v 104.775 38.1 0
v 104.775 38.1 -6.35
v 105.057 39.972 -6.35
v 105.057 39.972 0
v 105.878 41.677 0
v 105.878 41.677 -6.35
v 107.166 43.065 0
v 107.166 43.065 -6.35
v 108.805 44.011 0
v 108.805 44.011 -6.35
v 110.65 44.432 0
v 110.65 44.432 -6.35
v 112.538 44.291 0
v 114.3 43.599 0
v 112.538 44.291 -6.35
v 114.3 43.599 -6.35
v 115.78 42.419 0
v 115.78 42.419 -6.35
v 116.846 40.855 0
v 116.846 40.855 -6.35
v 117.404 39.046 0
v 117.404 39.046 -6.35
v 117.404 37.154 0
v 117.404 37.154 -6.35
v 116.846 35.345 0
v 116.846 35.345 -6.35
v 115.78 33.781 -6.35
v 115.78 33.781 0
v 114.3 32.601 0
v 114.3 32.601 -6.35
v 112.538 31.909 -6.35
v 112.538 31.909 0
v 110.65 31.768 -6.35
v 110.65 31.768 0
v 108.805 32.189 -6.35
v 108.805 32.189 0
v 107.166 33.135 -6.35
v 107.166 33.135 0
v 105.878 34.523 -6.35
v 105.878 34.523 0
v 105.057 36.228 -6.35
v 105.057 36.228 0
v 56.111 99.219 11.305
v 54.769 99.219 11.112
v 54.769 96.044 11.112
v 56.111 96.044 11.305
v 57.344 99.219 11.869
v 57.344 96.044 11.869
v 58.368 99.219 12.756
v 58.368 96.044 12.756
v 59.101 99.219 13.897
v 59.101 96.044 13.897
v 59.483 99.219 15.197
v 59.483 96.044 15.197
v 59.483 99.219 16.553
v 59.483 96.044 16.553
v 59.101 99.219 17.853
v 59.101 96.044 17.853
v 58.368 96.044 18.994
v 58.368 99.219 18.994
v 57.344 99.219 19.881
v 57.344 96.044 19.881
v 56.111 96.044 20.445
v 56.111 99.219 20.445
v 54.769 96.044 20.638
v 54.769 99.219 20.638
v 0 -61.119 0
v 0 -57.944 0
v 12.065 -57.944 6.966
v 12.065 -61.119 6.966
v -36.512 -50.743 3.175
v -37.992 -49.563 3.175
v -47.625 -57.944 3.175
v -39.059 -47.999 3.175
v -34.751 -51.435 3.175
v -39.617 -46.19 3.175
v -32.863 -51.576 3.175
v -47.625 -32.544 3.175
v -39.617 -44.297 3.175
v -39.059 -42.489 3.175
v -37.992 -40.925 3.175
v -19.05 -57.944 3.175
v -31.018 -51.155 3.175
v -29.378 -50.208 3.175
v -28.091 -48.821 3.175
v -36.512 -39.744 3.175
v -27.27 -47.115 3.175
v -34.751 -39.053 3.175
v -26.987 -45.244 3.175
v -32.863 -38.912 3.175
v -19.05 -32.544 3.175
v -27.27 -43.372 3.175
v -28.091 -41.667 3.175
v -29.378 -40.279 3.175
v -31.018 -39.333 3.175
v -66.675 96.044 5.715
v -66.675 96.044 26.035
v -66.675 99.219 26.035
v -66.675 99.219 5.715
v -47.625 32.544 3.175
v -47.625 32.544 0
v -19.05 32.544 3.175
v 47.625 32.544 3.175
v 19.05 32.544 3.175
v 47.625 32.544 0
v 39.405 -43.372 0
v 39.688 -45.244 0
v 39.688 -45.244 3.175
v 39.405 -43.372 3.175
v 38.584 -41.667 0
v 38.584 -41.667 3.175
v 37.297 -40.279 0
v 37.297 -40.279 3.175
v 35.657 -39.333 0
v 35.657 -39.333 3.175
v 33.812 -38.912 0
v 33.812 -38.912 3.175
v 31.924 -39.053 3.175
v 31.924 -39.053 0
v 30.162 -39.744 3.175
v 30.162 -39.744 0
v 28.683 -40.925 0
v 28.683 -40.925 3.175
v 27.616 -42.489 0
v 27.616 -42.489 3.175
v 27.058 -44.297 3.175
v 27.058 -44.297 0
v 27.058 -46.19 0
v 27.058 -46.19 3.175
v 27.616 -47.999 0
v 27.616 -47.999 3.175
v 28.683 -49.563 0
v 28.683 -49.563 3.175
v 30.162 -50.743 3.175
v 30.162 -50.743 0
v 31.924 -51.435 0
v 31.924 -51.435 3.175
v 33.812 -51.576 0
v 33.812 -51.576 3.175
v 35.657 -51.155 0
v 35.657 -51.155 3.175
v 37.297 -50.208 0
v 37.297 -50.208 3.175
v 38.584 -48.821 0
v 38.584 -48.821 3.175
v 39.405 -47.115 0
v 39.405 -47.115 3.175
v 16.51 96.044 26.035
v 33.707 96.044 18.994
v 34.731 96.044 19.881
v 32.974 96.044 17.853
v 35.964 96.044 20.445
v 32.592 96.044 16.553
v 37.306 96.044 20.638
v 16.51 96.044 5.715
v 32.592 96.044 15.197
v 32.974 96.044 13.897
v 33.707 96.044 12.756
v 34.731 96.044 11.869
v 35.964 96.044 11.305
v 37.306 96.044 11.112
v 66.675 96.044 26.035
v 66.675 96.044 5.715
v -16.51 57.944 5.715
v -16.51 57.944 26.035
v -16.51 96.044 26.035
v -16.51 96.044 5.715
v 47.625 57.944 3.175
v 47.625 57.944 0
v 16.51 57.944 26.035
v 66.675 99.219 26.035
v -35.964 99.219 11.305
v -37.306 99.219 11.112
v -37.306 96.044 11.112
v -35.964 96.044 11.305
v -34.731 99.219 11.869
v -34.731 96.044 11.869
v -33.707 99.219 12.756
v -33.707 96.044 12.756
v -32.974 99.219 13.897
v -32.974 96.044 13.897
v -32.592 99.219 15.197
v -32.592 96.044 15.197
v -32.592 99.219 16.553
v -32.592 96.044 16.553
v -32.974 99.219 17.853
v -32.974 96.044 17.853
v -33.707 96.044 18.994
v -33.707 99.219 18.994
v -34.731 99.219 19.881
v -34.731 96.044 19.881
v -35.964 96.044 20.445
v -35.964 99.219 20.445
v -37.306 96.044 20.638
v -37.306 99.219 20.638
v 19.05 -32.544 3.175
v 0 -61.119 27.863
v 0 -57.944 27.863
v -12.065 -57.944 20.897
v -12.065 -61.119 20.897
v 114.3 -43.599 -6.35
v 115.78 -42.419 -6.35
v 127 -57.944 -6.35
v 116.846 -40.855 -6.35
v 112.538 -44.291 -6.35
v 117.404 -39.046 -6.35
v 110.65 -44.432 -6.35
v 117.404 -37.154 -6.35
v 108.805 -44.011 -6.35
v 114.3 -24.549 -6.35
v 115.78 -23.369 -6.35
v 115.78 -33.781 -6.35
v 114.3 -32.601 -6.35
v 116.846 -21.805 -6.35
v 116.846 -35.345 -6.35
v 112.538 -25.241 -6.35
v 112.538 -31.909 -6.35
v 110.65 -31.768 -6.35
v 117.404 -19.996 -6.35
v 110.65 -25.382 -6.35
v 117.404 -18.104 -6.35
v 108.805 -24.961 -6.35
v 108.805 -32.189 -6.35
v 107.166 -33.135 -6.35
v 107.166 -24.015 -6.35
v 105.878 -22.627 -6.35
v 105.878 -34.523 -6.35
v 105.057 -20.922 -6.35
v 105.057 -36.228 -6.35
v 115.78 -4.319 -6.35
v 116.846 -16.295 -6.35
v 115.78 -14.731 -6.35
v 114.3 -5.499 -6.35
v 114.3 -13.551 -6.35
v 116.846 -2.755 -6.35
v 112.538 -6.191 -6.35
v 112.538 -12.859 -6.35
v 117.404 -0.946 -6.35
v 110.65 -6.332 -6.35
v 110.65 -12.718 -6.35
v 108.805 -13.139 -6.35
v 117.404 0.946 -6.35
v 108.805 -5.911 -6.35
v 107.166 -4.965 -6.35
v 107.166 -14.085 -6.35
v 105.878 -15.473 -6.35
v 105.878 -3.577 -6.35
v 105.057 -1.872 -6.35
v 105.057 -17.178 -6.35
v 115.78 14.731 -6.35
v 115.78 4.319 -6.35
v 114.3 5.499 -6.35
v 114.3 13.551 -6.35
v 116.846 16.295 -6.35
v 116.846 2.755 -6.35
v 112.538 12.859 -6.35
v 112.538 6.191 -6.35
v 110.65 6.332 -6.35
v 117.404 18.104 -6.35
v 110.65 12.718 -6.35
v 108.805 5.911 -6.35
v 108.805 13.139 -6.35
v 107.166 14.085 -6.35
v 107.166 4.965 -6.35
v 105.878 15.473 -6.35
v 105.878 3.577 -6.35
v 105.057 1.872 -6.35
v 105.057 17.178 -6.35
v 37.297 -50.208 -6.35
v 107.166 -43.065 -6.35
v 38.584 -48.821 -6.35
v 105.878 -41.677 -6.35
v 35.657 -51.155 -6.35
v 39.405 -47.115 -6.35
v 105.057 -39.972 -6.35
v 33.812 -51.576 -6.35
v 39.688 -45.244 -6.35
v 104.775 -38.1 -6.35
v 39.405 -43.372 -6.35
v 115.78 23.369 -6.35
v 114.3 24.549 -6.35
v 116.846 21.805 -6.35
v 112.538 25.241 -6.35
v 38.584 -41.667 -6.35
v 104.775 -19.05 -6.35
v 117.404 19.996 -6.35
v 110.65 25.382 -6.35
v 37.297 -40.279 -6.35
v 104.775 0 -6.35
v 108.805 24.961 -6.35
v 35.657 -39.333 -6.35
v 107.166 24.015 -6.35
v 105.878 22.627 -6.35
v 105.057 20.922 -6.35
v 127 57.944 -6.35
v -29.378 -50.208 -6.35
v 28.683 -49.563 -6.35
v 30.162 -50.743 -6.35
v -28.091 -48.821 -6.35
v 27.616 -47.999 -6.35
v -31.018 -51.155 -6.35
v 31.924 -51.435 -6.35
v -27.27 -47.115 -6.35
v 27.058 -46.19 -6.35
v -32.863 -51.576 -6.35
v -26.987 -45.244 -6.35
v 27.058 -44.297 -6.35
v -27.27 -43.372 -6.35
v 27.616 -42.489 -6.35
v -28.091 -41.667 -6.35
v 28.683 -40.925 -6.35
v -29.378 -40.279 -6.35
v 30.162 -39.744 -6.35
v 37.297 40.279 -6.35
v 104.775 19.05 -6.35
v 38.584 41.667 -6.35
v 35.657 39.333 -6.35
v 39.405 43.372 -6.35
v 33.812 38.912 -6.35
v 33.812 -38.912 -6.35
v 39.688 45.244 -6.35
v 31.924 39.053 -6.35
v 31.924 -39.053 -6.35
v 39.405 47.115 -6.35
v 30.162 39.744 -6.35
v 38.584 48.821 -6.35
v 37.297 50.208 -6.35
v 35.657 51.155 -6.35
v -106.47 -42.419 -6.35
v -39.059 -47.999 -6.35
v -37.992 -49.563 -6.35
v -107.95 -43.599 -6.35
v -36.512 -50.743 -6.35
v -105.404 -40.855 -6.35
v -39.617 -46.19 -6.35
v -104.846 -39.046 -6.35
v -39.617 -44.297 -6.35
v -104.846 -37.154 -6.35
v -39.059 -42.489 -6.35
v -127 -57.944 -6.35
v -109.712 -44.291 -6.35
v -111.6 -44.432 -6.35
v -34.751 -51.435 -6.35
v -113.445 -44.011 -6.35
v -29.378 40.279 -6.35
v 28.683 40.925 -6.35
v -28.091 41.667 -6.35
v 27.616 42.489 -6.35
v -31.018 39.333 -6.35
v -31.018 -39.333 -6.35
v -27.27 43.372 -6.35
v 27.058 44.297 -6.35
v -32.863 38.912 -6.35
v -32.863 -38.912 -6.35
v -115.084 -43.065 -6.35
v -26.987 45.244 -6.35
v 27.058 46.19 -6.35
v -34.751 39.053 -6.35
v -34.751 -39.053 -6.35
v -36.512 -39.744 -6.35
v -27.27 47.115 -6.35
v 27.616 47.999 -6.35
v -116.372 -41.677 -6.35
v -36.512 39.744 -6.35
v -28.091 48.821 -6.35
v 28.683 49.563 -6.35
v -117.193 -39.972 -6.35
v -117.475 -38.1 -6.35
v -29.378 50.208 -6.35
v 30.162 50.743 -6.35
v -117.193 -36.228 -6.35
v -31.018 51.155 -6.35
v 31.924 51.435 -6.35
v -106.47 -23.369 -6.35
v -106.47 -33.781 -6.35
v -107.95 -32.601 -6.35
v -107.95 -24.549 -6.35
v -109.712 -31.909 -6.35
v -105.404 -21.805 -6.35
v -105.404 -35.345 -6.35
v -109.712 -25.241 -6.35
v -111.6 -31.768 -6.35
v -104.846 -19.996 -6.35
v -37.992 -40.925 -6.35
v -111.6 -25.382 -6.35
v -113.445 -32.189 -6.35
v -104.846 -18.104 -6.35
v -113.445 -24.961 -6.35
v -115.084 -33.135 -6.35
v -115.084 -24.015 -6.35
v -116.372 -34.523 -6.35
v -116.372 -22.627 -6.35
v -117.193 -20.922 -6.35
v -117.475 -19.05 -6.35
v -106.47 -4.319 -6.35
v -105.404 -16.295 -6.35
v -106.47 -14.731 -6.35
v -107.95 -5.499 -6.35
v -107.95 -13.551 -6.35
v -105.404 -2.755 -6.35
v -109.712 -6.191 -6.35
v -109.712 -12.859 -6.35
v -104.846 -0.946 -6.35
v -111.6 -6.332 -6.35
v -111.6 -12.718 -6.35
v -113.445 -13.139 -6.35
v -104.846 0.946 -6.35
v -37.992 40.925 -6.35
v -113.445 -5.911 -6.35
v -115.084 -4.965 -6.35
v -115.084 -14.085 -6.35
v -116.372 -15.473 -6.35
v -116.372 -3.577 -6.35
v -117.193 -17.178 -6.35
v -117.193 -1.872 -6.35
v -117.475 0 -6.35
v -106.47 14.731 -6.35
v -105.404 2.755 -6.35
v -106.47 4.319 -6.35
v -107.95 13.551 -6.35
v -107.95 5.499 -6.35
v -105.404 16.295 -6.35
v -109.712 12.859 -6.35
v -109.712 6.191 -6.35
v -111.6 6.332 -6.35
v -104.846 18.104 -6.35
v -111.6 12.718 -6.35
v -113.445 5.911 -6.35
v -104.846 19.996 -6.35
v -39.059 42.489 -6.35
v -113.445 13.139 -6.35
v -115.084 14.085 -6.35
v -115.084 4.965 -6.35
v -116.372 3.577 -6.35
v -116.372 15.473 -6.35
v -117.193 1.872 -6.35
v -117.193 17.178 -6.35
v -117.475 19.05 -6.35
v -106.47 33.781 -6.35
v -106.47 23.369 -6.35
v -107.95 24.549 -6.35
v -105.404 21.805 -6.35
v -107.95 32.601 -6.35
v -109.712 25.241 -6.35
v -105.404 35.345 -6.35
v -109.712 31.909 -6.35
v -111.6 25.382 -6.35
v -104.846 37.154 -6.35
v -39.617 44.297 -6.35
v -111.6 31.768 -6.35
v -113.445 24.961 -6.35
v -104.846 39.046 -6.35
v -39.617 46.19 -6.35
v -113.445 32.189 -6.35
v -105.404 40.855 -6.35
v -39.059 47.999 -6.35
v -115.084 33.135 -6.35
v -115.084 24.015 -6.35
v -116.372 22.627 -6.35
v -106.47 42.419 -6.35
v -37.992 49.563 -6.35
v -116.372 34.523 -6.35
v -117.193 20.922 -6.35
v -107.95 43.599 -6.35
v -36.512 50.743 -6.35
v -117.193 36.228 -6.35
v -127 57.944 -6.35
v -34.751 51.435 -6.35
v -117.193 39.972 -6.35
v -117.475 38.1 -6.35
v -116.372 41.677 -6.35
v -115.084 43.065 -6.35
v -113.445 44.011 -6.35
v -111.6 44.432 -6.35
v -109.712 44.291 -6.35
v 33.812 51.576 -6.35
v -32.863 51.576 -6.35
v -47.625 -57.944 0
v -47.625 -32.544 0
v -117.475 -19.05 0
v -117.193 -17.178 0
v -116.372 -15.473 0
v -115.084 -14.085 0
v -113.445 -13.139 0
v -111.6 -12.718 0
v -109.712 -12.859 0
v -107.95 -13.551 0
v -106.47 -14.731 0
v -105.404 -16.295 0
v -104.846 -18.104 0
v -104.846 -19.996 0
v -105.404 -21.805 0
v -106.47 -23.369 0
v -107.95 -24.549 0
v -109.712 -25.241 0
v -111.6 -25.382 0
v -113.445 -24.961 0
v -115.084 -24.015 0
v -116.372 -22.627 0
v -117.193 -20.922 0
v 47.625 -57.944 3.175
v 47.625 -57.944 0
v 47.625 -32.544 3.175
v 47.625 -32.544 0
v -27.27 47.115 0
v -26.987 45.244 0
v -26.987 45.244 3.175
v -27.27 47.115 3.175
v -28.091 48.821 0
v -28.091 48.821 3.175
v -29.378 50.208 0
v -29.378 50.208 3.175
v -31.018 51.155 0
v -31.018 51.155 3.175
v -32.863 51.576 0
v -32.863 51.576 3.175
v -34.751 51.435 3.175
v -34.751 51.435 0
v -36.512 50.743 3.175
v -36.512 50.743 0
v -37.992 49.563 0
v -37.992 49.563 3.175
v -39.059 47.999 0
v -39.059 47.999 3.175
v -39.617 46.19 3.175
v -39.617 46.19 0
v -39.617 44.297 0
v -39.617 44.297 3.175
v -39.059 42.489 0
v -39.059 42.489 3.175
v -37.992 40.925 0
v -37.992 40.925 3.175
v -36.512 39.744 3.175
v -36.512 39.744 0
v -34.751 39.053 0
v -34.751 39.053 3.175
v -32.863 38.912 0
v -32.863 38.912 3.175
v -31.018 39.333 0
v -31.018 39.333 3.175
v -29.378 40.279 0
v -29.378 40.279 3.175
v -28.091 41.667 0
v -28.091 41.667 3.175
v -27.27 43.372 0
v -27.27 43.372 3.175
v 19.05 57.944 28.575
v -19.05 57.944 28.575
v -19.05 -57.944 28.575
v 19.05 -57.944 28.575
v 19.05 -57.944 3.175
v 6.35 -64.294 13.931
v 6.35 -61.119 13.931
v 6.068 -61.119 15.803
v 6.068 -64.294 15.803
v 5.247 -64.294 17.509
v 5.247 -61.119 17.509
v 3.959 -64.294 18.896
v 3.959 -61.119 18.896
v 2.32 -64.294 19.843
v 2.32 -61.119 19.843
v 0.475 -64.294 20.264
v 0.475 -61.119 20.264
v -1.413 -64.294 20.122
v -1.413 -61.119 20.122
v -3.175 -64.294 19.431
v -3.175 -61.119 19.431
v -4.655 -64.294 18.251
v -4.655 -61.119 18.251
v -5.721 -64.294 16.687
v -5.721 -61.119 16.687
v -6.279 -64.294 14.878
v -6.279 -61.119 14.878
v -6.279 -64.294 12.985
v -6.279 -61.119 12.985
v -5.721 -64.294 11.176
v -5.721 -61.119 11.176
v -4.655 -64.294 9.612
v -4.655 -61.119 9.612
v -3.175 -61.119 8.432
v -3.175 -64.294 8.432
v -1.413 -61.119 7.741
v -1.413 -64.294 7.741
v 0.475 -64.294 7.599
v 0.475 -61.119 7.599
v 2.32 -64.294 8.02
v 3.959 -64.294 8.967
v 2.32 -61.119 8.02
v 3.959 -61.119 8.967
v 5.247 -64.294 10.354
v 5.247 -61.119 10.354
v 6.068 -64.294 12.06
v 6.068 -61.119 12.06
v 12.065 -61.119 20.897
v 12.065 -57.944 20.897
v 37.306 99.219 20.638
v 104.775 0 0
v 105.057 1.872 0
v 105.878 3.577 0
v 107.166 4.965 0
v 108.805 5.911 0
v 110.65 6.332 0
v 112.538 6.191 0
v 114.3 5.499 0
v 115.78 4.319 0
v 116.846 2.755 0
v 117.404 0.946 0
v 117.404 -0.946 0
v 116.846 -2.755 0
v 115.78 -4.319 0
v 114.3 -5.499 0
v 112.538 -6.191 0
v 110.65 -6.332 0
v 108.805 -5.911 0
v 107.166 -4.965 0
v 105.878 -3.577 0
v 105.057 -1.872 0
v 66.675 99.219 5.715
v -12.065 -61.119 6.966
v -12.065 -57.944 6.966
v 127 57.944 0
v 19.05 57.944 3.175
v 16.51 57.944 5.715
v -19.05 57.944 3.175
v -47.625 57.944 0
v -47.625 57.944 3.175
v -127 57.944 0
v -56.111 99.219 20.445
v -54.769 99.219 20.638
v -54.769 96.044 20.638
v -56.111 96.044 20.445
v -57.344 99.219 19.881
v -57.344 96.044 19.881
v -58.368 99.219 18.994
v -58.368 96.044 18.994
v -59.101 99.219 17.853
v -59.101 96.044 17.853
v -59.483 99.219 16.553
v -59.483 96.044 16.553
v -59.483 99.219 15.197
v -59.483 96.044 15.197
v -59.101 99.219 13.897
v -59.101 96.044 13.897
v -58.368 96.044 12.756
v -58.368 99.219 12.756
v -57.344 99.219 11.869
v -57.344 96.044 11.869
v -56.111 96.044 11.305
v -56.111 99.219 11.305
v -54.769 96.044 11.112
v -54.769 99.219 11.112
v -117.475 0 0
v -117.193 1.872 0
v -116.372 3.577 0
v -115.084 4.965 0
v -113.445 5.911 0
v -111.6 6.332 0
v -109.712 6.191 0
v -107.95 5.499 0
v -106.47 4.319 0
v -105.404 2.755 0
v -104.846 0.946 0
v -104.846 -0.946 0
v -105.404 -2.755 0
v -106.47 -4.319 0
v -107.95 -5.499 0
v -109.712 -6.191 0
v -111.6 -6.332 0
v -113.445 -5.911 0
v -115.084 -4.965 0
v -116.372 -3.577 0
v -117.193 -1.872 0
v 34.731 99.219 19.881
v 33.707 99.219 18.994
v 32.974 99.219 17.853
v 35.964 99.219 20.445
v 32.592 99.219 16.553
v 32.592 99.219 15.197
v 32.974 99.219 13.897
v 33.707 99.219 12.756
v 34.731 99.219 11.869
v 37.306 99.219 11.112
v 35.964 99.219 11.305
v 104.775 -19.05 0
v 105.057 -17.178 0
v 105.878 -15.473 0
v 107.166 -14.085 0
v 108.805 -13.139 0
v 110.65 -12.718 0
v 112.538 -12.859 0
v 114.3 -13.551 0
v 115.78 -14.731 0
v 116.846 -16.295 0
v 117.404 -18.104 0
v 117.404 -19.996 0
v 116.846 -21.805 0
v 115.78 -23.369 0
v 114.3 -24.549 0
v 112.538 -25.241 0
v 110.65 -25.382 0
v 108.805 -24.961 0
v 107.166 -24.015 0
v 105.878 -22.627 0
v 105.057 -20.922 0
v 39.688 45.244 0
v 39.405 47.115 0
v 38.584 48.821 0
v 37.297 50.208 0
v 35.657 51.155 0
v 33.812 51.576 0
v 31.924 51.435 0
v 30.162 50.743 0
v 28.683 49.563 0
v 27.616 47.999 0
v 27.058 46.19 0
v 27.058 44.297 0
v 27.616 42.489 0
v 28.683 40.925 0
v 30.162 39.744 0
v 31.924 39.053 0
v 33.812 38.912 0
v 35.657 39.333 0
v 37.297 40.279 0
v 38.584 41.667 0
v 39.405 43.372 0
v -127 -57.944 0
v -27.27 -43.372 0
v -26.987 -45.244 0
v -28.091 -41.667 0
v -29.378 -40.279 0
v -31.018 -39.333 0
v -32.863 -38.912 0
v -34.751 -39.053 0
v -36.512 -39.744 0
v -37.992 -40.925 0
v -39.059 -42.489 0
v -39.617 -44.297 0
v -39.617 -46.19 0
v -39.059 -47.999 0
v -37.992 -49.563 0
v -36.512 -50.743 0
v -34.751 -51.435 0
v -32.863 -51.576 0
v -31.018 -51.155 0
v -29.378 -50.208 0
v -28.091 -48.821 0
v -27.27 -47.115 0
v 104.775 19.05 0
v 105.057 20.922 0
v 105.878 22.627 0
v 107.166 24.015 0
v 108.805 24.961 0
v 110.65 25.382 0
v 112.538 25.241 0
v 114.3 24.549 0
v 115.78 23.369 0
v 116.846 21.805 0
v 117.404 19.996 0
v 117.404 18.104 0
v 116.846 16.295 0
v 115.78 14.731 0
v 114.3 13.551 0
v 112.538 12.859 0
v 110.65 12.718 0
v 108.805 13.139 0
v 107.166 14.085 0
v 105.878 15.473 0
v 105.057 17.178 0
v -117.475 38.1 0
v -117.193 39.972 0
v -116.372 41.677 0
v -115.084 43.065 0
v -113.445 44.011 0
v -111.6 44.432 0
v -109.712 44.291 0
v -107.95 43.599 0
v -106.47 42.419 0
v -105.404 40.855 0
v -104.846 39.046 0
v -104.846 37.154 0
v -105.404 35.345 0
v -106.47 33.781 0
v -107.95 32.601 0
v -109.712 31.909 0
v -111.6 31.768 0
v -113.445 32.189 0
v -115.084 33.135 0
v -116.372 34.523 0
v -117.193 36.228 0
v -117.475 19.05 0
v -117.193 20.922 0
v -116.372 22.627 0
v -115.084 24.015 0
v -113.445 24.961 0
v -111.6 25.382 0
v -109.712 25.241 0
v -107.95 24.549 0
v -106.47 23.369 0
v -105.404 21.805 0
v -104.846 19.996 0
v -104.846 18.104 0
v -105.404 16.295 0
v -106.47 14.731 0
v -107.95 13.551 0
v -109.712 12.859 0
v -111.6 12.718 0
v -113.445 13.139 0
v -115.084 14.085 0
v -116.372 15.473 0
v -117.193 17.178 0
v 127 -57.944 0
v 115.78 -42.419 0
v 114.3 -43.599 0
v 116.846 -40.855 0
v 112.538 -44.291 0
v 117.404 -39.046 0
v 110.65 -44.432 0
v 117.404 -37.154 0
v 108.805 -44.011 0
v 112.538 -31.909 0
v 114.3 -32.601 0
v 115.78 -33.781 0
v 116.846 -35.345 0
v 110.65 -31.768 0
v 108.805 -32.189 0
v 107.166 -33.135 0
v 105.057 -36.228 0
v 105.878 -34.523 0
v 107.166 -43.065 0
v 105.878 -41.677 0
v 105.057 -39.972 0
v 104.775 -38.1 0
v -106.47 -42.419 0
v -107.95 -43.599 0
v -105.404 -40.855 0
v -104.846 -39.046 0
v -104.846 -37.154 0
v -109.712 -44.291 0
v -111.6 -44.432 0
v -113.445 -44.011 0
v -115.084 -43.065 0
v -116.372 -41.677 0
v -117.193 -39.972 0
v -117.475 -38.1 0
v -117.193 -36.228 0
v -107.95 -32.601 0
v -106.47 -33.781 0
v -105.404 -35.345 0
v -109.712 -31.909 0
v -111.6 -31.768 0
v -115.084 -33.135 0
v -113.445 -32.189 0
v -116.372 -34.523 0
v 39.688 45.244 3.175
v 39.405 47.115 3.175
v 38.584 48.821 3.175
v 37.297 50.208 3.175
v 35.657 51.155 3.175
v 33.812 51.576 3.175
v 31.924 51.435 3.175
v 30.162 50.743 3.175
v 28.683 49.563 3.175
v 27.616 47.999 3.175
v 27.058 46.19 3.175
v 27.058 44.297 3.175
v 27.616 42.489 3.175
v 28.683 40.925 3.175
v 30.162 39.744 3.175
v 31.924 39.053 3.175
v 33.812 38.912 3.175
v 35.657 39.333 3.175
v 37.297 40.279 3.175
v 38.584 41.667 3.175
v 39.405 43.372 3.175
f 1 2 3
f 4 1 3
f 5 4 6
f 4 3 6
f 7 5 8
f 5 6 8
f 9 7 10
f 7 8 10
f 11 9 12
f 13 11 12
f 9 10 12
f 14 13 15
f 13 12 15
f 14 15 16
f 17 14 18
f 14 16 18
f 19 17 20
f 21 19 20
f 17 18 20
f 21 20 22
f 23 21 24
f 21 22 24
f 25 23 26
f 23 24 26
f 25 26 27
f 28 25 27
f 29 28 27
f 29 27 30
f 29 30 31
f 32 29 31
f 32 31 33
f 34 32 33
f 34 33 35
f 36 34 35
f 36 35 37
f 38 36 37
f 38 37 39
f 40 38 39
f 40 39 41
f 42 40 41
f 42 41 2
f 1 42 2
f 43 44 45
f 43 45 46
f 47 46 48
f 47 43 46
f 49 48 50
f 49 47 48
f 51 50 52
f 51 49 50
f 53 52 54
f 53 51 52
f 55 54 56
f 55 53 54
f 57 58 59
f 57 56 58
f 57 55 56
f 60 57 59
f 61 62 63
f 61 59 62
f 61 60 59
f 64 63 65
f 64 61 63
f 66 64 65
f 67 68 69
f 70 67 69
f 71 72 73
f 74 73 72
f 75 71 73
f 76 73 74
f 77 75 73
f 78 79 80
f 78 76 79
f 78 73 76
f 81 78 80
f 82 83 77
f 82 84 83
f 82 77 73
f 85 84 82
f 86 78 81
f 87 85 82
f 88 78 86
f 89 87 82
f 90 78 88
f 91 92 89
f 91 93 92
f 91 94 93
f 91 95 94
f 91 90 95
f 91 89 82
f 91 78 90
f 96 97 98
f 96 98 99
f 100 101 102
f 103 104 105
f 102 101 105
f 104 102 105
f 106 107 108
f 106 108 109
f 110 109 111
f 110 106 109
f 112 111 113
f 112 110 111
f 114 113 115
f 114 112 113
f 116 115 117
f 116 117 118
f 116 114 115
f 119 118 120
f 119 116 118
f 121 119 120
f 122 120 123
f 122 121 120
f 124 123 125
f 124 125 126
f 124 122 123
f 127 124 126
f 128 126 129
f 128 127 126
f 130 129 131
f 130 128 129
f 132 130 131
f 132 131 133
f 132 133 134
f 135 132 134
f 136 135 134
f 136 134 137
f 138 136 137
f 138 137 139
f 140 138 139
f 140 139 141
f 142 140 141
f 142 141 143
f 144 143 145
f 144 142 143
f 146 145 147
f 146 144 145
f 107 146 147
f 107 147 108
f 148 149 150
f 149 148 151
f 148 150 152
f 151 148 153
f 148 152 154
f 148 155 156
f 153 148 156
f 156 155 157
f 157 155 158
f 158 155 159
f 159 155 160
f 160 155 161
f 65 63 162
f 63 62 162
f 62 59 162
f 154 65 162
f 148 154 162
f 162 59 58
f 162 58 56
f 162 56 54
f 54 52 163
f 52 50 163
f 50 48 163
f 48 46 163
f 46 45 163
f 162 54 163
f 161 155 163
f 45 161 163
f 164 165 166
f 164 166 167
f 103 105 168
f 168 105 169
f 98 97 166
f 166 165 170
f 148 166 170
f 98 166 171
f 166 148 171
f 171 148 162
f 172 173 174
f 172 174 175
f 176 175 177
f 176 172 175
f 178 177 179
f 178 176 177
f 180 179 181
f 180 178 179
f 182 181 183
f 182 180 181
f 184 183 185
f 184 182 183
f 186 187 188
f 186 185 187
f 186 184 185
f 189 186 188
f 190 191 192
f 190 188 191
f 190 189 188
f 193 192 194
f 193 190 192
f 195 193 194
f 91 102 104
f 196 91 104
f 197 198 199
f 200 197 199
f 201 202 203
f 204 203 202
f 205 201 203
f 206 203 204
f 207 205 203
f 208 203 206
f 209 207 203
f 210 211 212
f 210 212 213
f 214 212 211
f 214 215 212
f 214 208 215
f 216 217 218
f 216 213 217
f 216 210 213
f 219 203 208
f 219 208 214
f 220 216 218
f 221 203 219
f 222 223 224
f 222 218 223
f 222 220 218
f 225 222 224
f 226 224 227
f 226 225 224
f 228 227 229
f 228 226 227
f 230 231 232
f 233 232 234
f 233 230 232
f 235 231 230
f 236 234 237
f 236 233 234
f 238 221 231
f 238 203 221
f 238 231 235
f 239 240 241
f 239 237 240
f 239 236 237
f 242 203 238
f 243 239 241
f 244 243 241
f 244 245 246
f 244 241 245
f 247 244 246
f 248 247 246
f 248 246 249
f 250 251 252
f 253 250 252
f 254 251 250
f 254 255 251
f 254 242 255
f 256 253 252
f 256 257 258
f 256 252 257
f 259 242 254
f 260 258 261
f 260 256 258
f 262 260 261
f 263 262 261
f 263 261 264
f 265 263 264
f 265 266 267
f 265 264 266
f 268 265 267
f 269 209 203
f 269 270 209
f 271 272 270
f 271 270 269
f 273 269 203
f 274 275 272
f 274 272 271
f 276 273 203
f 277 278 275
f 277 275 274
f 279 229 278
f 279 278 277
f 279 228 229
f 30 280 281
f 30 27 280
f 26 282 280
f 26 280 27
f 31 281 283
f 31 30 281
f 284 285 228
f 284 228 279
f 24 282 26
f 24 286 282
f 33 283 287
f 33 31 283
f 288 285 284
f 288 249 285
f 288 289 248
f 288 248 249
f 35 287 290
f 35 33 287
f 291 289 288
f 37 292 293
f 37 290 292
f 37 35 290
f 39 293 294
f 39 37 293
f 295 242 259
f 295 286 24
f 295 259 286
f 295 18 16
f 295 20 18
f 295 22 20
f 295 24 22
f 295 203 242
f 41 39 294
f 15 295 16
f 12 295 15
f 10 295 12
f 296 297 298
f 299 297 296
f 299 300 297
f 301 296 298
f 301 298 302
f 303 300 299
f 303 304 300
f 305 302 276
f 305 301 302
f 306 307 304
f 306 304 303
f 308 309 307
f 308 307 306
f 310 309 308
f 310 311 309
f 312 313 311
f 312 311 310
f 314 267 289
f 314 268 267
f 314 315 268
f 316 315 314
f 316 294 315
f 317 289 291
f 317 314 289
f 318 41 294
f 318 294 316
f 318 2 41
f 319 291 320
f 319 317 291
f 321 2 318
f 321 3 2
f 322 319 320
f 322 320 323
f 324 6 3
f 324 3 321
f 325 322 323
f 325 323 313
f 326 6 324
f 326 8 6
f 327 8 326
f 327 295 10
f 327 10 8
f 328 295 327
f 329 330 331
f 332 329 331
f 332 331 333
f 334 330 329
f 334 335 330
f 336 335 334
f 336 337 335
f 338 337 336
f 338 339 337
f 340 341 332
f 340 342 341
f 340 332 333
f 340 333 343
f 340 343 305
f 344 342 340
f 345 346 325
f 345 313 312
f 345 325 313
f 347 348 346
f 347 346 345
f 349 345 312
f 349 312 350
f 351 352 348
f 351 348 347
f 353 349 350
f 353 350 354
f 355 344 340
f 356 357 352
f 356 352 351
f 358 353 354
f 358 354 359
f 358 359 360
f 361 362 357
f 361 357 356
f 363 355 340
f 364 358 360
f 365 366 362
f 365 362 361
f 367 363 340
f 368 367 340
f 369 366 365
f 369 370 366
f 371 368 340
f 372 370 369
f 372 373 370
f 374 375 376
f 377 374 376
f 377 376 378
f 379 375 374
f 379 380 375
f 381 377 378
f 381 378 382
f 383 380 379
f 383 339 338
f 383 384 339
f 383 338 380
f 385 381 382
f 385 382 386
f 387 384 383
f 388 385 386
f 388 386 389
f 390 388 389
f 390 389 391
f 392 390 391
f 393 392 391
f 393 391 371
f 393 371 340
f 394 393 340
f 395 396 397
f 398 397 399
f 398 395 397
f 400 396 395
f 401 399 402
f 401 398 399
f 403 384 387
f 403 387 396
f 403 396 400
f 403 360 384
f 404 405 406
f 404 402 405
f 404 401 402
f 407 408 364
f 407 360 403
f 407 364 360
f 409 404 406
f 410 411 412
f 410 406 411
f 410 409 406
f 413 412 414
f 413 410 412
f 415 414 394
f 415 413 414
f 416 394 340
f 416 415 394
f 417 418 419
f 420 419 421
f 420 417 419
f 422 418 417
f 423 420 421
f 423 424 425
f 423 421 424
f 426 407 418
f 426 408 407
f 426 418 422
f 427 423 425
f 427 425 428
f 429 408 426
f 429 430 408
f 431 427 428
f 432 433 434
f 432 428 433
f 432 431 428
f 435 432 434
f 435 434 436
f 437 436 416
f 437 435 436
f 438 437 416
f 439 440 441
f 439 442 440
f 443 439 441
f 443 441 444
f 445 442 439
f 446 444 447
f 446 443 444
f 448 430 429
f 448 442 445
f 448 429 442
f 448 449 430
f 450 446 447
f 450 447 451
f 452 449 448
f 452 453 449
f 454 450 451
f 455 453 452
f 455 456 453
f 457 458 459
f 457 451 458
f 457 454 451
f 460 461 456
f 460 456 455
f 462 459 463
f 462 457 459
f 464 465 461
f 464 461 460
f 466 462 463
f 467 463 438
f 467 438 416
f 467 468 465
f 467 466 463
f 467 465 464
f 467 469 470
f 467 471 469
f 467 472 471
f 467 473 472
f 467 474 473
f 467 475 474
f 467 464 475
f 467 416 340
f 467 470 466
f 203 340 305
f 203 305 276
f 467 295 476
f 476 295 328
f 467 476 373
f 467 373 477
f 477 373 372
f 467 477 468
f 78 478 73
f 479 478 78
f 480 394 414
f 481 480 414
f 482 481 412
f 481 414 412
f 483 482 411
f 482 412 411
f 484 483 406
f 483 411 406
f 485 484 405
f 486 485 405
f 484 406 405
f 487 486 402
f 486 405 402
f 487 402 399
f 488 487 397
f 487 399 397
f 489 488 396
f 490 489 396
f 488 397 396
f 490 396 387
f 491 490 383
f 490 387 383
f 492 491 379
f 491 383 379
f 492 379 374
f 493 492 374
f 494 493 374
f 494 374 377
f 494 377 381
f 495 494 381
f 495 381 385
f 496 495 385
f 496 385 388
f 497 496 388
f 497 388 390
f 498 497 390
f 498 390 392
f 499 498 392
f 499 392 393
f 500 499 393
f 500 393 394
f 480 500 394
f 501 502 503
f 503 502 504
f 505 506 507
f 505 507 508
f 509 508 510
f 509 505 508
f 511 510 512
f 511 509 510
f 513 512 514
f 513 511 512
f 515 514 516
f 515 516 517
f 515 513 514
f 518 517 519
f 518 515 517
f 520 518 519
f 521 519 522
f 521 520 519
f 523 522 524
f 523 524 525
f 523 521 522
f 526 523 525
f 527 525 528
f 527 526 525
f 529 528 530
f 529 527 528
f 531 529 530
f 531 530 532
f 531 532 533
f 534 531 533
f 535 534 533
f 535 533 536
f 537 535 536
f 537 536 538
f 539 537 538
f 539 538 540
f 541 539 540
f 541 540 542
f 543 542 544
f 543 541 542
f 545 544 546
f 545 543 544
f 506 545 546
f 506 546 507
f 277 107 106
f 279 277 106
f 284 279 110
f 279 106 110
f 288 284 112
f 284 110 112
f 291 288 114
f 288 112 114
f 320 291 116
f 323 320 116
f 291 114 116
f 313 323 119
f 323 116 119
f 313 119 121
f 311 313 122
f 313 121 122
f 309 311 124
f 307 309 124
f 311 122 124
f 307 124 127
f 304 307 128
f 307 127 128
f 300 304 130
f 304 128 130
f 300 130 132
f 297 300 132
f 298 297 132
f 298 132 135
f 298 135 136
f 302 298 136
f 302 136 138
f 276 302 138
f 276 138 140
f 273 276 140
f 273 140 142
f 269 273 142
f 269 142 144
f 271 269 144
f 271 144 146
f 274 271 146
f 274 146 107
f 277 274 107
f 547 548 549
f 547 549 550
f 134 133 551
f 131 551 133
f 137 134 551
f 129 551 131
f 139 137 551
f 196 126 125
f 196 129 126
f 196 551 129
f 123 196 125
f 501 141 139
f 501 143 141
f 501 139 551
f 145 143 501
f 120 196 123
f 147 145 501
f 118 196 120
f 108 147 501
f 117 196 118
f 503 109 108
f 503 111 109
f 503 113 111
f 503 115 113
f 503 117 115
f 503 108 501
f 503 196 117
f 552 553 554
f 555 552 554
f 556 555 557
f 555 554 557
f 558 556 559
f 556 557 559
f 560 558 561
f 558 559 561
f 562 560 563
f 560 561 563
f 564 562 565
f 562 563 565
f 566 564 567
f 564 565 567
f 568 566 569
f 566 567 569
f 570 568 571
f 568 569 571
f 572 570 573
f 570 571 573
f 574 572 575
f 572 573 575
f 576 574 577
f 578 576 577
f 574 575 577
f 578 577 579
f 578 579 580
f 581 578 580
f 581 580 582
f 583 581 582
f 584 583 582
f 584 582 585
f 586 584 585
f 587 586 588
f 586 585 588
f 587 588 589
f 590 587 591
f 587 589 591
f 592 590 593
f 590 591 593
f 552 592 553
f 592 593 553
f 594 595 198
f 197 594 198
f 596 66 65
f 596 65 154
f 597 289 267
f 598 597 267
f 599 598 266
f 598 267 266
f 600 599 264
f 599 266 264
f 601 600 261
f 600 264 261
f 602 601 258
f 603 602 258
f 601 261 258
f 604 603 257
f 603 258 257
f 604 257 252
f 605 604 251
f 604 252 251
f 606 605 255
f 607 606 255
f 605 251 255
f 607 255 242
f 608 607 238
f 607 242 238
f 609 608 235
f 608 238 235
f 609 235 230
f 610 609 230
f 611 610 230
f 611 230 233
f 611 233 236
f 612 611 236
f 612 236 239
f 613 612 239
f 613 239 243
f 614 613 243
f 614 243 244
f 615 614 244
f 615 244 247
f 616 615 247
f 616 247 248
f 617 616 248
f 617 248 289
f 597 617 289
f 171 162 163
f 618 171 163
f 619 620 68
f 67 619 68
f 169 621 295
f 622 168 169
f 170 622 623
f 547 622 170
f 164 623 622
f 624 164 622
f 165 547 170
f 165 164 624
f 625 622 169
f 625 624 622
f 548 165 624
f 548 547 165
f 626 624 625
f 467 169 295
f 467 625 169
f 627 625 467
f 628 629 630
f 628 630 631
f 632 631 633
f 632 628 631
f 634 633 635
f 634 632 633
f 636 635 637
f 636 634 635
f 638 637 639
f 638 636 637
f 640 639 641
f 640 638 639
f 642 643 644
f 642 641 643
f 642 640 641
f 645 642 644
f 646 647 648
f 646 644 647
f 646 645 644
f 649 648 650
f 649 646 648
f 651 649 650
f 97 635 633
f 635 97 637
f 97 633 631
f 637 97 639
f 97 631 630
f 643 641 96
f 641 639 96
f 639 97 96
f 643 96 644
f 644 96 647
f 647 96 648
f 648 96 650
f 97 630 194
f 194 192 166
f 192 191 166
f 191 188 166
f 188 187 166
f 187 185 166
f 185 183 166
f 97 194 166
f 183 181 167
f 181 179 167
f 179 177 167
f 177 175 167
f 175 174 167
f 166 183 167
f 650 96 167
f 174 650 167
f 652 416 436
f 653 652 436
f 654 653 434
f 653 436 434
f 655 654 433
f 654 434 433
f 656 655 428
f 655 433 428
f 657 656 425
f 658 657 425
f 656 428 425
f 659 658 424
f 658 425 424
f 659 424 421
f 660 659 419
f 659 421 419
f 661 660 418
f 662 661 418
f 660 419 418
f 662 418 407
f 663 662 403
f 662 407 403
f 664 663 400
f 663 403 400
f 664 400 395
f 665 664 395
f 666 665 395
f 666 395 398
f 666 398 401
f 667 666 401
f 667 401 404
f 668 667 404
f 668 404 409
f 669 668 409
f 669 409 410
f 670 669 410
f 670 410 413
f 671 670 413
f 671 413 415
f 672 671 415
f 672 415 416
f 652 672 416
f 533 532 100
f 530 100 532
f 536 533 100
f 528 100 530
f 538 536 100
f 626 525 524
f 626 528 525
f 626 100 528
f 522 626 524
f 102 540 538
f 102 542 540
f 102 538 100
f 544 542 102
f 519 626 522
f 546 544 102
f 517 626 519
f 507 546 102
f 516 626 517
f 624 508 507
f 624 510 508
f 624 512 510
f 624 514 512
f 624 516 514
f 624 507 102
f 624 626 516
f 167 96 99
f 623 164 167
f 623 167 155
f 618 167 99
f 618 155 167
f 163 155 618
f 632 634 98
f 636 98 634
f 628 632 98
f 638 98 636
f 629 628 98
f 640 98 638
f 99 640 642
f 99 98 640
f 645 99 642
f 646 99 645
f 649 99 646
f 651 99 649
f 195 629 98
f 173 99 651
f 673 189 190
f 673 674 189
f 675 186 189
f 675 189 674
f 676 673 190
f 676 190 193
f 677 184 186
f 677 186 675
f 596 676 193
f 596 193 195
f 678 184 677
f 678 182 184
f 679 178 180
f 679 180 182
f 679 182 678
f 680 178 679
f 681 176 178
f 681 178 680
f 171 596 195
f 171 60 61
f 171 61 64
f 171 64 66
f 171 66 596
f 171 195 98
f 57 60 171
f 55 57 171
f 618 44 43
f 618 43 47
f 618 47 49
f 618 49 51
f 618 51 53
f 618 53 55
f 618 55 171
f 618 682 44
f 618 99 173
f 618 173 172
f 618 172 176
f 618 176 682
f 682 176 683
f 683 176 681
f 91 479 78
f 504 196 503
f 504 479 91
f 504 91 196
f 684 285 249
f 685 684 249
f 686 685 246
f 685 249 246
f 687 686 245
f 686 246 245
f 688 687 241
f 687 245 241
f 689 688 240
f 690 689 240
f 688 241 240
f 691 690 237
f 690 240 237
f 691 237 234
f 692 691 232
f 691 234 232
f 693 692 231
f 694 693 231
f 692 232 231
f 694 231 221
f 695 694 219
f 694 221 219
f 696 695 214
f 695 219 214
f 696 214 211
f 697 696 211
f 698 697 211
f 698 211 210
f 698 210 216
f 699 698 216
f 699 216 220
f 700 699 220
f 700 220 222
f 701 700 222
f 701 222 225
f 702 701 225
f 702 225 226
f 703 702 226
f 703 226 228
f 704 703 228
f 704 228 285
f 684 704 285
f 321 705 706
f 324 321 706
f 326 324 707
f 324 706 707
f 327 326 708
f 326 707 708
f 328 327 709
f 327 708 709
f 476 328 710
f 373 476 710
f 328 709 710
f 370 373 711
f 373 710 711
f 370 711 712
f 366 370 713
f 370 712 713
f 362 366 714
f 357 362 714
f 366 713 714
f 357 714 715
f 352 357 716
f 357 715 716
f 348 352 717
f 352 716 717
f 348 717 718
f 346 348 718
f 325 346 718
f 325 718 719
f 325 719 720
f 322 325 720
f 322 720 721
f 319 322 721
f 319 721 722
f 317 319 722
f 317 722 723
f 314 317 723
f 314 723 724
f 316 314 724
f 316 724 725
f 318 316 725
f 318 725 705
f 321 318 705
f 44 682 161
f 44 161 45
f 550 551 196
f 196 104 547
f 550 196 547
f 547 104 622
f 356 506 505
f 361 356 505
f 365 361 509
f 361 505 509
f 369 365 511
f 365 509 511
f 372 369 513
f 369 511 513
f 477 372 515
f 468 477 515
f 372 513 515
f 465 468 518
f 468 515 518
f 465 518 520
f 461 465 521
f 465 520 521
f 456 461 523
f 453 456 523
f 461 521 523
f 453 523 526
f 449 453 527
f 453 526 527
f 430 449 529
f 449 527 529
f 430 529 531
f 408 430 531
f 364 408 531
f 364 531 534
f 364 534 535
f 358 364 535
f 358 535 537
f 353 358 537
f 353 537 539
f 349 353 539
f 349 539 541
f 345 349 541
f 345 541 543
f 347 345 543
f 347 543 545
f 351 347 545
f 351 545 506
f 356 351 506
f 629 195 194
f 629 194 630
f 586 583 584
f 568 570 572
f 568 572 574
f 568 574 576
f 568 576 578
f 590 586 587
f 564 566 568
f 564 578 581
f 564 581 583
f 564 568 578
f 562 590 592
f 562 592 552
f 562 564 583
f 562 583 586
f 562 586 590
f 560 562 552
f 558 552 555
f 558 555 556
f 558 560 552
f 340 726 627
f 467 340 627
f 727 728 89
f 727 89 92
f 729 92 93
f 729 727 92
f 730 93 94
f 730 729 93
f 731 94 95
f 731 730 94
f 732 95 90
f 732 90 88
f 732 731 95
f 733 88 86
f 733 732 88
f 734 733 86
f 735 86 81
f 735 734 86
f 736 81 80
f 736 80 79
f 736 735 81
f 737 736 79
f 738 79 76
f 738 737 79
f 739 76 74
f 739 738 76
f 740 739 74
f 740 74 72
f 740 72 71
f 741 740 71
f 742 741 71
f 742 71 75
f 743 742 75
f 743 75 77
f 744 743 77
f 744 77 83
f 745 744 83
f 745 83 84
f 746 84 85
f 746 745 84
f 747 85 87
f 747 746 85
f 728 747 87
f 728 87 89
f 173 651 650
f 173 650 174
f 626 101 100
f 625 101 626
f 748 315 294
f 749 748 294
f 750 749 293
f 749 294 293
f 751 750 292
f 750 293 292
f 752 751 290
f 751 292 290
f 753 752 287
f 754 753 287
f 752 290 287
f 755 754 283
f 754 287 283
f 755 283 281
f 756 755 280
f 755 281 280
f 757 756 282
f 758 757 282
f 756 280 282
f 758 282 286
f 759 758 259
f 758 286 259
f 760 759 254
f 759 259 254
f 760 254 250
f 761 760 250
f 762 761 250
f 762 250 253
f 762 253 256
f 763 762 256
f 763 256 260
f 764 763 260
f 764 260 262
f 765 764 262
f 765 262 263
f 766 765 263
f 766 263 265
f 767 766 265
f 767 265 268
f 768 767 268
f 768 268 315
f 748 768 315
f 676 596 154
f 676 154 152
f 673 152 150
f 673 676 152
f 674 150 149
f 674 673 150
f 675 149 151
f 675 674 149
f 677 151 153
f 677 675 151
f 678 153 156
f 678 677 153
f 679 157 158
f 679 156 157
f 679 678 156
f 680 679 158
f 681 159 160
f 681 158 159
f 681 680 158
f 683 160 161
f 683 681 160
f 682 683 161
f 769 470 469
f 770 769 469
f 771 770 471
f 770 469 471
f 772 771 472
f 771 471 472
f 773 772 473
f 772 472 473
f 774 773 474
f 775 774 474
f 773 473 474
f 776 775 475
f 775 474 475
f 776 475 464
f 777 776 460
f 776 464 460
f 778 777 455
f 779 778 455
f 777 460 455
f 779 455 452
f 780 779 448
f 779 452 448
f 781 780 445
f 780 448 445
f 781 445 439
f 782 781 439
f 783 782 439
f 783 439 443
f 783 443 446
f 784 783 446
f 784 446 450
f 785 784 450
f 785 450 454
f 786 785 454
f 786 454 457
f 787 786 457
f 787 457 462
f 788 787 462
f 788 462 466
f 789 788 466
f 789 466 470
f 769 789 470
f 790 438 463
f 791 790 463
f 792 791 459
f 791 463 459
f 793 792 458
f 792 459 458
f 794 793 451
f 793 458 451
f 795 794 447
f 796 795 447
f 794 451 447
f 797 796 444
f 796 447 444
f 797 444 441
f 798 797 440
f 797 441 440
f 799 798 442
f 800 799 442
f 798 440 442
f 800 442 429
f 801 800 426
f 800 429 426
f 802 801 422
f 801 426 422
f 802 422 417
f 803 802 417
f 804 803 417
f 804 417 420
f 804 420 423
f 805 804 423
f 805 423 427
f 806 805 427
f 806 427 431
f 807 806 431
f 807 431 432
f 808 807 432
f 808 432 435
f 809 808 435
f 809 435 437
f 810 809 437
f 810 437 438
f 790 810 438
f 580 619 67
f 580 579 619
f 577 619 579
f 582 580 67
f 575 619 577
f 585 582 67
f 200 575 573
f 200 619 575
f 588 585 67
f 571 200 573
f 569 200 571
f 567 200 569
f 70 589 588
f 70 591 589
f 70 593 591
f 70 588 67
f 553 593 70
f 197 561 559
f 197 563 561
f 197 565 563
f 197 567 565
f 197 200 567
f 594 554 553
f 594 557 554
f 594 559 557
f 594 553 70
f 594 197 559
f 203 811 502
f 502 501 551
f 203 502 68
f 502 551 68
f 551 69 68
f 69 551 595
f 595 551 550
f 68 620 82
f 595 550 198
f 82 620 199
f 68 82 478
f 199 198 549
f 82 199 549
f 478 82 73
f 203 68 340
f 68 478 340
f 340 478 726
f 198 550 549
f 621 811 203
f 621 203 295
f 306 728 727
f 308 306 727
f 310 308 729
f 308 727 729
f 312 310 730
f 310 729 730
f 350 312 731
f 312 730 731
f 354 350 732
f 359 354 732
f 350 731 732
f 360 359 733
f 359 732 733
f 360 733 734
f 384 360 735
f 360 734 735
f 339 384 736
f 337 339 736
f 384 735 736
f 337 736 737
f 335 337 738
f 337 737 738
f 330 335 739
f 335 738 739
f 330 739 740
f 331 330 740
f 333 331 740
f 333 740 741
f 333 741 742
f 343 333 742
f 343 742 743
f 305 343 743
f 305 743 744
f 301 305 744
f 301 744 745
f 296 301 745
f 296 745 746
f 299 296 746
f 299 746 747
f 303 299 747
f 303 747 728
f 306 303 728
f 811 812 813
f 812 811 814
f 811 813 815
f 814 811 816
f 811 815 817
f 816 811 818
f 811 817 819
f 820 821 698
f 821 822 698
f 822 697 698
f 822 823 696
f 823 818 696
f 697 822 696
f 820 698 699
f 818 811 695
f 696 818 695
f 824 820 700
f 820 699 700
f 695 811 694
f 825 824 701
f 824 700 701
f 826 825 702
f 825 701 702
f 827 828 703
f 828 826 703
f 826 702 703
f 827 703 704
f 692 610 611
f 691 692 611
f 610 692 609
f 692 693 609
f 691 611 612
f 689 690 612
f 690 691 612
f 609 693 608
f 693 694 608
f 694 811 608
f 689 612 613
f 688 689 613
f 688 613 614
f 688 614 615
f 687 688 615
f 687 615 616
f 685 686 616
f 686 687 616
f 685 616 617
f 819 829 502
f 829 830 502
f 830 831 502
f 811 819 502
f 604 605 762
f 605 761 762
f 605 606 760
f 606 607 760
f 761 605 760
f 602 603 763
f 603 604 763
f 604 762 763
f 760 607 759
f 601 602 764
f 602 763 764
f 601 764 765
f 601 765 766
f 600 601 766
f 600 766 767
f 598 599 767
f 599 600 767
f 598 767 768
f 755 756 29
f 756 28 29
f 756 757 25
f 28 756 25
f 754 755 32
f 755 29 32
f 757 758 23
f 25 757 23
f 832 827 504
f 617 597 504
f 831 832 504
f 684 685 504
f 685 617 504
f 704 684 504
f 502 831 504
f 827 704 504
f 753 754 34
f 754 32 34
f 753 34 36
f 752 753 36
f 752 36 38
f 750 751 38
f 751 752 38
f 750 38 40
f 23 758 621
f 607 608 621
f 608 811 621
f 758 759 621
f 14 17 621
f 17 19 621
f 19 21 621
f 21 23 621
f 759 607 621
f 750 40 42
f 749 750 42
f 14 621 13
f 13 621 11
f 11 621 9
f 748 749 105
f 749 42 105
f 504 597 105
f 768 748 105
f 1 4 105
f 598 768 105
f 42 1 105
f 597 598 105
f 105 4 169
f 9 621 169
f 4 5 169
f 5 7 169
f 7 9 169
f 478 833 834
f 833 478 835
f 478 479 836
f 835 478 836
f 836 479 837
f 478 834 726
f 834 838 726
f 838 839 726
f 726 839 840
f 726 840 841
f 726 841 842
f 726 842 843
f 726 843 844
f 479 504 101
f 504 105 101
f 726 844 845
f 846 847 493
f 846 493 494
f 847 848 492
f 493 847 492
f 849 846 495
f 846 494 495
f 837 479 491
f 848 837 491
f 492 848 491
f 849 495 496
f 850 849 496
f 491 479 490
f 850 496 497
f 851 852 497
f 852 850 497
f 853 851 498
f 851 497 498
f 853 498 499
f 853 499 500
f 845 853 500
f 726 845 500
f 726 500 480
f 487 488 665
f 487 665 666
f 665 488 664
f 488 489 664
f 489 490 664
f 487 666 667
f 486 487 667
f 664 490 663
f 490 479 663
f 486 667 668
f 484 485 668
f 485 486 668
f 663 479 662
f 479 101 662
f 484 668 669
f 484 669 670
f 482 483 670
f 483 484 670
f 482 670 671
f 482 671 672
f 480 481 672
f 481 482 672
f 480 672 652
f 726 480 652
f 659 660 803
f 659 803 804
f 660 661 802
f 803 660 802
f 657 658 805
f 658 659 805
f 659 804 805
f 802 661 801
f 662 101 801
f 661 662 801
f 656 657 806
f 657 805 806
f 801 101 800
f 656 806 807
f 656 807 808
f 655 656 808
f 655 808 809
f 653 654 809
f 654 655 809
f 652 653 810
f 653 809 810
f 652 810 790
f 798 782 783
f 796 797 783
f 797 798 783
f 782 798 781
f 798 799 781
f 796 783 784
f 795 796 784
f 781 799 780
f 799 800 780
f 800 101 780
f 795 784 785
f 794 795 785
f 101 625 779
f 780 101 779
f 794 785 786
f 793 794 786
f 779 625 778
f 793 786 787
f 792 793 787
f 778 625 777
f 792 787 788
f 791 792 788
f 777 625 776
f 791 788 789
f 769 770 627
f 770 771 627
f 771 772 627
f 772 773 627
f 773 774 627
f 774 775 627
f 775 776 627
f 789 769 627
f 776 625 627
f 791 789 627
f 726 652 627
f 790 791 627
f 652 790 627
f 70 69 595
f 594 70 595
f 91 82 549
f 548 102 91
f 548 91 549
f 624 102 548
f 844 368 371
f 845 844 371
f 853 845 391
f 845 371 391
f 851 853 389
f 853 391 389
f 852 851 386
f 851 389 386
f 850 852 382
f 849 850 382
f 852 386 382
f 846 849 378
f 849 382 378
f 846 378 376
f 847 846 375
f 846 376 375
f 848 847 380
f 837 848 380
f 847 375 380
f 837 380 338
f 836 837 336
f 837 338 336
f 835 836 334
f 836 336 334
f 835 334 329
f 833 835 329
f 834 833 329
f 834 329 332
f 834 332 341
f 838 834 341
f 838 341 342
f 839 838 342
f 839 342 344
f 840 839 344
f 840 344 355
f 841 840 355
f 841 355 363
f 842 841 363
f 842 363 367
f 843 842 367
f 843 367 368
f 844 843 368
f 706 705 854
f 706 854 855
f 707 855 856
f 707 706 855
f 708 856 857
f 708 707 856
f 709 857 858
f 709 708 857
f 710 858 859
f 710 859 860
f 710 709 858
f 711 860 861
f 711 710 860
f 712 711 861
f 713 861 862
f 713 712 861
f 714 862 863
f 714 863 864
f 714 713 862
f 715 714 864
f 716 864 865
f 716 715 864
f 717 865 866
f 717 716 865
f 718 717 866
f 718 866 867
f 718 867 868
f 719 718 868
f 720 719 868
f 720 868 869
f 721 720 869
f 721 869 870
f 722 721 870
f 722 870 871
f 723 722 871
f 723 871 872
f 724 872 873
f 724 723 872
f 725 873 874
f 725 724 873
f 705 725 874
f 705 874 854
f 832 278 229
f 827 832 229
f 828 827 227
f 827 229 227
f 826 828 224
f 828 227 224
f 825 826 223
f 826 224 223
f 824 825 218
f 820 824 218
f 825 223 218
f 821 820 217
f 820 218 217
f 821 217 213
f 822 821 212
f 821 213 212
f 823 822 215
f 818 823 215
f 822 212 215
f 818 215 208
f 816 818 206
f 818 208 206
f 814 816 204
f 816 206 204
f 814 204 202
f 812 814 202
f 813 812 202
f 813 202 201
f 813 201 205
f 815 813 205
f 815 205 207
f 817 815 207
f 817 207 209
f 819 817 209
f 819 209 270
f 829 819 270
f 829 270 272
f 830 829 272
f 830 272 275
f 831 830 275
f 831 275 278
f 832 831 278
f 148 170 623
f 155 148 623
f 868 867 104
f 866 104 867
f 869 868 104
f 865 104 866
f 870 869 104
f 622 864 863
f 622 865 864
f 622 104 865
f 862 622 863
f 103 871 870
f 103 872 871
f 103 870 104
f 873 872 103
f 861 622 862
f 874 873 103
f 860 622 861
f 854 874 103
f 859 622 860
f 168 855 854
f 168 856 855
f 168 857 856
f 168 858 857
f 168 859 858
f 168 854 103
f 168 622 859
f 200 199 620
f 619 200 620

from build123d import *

# Parameters (mm, degrees)
SKETCH2_W           = 95.25
SKETCH2_H           = 25.4
SKETCH2_R           = 6.35
EXTRUDE1_DEPTH      = 3.175
EXTRUDE1_2_DEPTH    = 3.175
SKETCH3_W           = 38.1
SKETCH3_H           = 115.8875
EXTRUDE2_DEPTH      = 25.4
SKETCH4_W           = 33.02
SKETCH4_H           = 20.32
EXTRUDE3_DEPTH      = 38.1
SKETCH5_W           = 133.35
SKETCH5_H           = 20.32
EXTRUDE4_DEPTH      = 3.175
CUT_EXTRUDE1_DEPTH  = 158.1625
EXTRUDE5_DEPTH      = 3.175
SKETCH9_R           = 6.35
EXTRUDE6_DEPTH      = 3.175
SKETCH10_W          = 254
SKETCH10_H          = 115.8875
EXTRUDE7_DEPTH      = 6.35
SKETCH11_R          = 6.35
CUT_EXTRUDE2_DEPTH  = 7.35
SKETCH12_R          = 6.35
CUT_EXTRUDE3_DEPTH  = 35.925
LPATTERN1_COUNT     = 3
LPATTERN1_PITCH     = 19.05
LPATTERN1_COL_COUNT = 3
LPATTERN1_COL_PITCH = 19.05


with BuildPart() as part:
    # Sketch2 → Extrude1 (new body)
    with BuildSketch(Plane.XY):
        with Locations((0, -45.24375)):
            Rectangle(SKETCH2_W, SKETCH2_H)
        with Locations((-33.3375, -45.24375)):
            Circle(SKETCH2_R, mode=Mode.SUBTRACT)
        with Locations((33.3375, -45.24375)):
            Circle(SKETCH2_R, mode=Mode.SUBTRACT)
    extrude(amount=EXTRUDE1_DEPTH)



with BuildPart() as body_2:
    # Sketch2 → Extrude1 2 (new body)
    with BuildSketch(Plane.XY):
        with Locations((0, 45.24375)):
            Rectangle(SKETCH2_W, SKETCH2_H)
        with Locations((33.3375, 45.24375)):
            Circle(SKETCH2_R, mode=Mode.SUBTRACT)
        with Locations((-33.3375, 45.24375)):
            Circle(SKETCH2_R, mode=Mode.SUBTRACT)
    extrude(amount=EXTRUDE1_2_DEPTH)


with BuildPart() as part_1:
    add(part.part)

    add(body_2.part)  # Extrude2 merges body 2
    # Sketch3 → Extrude2 (add)
    with BuildSketch(Plane.XY.offset(3.175)):
        Rectangle(SKETCH3_W, SKETCH3_H)
    extrude(amount=EXTRUDE2_DEPTH)

    # Sketch4 → Extrude3 (add)
    with BuildSketch(Plane(origin=(0, 57.94375, 0), x_dir=(1, 0, 0), z_dir=(0, 1, 0))):
        with Locations((0, -15.875)):
            Rectangle(SKETCH4_W, SKETCH4_H)
    extrude(amount=EXTRUDE3_DEPTH)

    # Sketch5 → Extrude4 (add)
    with BuildSketch(Plane(origin=(0, 96.04375, 0), x_dir=(1, 0, 0), z_dir=(0, 1, 0))):
        with Locations((0, -15.875)):
            Rectangle(SKETCH5_W, SKETCH5_H)
    extrude(amount=EXTRUDE4_DEPTH)

    # Sketch6 → Cut-Extrude1 (cut, through all)
    with BuildSketch(Plane(origin=(0, 99.21875, 0), x_dir=(1, 0, 0), z_dir=(0, 1, 0))):
        with BuildLine():
            Line((54.76875, -20.6375), (37.30625, -20.6375))
            ThreePointArc((37.30625, -20.6375), (32.54375, -15.875), (37.30625, -11.1125))
            Line((37.30625, -11.1125), (54.76875, -11.1125))
            ThreePointArc((54.76875, -11.1125), (59.53125, -15.875), (54.76875, -20.6375))
        make_face()
        with BuildLine():
            Line((-54.76875, -11.1125), (-37.30625, -11.1125))
            ThreePointArc((-37.30625, -11.1125), (-32.54375, -15.875), (-37.30625, -20.6375))
            Line((-37.30625, -20.6375), (-54.76875, -20.6375))
            ThreePointArc((-54.76875, -20.6375), (-59.53125, -15.875), (-54.76875, -11.1125))
        make_face()
    extrude(amount=-CUT_EXTRUDE1_DEPTH, mode=Mode.SUBTRACT)

    # Sketch8 → Extrude5 (add)
    with BuildSketch(Plane.XZ.offset(57.94375)):
        Polygon((12.065, 6.965730998), (12.065, 20.897192993), (0, 27.862923991), (-12.065, 20.897192993), (-12.065, 6.965730998), (0, 0), align=None)
    extrude(amount=EXTRUDE5_DEPTH)

    # Sketch9 → Extrude6 (add)
    with BuildSketch(Plane.XZ.offset(61.11875)):
        with Locations((0, 13.931461996)):
            Circle(SKETCH9_R)
    extrude(amount=EXTRUDE6_DEPTH)

    # Sketch10 → Extrude7 (add)
    with BuildSketch(Plane(origin=(0, 0, 0), x_dir=(-1, 0, 0), z_dir=(0, 0, -1))):
        Rectangle(SKETCH10_W, SKETCH10_H)
    extrude(amount=EXTRUDE7_DEPTH)

    # Sketch11 → Cut-Extrude2 (cut, through all)
    with BuildSketch(Plane.XY):
        with Locations((33.3375, -45.24375)):
            Circle(SKETCH11_R)
        with Locations((-33.3375, -45.24375)):
            Circle(SKETCH11_R)
        with Locations((-33.3375, 45.24375)):
            Circle(SKETCH11_R)
        with Locations((33.3375, 45.24375)):
            Circle(SKETCH11_R)
    extrude(amount=-CUT_EXTRUDE2_DEPTH, mode=Mode.SUBTRACT)

    # Sketch12 → Cut-Extrude3 (cut, through all)
    with BuildSketch(Plane(origin=(0, 0, -6.35), x_dir=(-1, 0, 0), z_dir=(0, 0, -1))):
        with Locations((-111.125, 0)):
            Circle(SKETCH12_R)
        with Locations((111.125, 0)):
            Circle(SKETCH12_R)
    cut_extrude3 = extrude(amount=-CUT_EXTRUDE3_DEPTH, mode=Mode.SUBTRACT)

    # LPattern1: Cut-Extrude3 ×3
    with Locations(*[(0, i * LPATTERN1_PITCH, 0) for i in range(1, LPATTERN1_COUNT)]):
        add(cut_extrude3, mode=Mode.SUBTRACT)

    # LPattern1 col: Cut-Extrude3 ×3
    with Locations(*[(0, -i * LPATTERN1_COL_PITCH, 0) for i in range(1, LPATTERN1_COL_COUNT)]):
        add(cut_extrude3, mode=Mode.SUBTRACT)


solid = part_1.part
